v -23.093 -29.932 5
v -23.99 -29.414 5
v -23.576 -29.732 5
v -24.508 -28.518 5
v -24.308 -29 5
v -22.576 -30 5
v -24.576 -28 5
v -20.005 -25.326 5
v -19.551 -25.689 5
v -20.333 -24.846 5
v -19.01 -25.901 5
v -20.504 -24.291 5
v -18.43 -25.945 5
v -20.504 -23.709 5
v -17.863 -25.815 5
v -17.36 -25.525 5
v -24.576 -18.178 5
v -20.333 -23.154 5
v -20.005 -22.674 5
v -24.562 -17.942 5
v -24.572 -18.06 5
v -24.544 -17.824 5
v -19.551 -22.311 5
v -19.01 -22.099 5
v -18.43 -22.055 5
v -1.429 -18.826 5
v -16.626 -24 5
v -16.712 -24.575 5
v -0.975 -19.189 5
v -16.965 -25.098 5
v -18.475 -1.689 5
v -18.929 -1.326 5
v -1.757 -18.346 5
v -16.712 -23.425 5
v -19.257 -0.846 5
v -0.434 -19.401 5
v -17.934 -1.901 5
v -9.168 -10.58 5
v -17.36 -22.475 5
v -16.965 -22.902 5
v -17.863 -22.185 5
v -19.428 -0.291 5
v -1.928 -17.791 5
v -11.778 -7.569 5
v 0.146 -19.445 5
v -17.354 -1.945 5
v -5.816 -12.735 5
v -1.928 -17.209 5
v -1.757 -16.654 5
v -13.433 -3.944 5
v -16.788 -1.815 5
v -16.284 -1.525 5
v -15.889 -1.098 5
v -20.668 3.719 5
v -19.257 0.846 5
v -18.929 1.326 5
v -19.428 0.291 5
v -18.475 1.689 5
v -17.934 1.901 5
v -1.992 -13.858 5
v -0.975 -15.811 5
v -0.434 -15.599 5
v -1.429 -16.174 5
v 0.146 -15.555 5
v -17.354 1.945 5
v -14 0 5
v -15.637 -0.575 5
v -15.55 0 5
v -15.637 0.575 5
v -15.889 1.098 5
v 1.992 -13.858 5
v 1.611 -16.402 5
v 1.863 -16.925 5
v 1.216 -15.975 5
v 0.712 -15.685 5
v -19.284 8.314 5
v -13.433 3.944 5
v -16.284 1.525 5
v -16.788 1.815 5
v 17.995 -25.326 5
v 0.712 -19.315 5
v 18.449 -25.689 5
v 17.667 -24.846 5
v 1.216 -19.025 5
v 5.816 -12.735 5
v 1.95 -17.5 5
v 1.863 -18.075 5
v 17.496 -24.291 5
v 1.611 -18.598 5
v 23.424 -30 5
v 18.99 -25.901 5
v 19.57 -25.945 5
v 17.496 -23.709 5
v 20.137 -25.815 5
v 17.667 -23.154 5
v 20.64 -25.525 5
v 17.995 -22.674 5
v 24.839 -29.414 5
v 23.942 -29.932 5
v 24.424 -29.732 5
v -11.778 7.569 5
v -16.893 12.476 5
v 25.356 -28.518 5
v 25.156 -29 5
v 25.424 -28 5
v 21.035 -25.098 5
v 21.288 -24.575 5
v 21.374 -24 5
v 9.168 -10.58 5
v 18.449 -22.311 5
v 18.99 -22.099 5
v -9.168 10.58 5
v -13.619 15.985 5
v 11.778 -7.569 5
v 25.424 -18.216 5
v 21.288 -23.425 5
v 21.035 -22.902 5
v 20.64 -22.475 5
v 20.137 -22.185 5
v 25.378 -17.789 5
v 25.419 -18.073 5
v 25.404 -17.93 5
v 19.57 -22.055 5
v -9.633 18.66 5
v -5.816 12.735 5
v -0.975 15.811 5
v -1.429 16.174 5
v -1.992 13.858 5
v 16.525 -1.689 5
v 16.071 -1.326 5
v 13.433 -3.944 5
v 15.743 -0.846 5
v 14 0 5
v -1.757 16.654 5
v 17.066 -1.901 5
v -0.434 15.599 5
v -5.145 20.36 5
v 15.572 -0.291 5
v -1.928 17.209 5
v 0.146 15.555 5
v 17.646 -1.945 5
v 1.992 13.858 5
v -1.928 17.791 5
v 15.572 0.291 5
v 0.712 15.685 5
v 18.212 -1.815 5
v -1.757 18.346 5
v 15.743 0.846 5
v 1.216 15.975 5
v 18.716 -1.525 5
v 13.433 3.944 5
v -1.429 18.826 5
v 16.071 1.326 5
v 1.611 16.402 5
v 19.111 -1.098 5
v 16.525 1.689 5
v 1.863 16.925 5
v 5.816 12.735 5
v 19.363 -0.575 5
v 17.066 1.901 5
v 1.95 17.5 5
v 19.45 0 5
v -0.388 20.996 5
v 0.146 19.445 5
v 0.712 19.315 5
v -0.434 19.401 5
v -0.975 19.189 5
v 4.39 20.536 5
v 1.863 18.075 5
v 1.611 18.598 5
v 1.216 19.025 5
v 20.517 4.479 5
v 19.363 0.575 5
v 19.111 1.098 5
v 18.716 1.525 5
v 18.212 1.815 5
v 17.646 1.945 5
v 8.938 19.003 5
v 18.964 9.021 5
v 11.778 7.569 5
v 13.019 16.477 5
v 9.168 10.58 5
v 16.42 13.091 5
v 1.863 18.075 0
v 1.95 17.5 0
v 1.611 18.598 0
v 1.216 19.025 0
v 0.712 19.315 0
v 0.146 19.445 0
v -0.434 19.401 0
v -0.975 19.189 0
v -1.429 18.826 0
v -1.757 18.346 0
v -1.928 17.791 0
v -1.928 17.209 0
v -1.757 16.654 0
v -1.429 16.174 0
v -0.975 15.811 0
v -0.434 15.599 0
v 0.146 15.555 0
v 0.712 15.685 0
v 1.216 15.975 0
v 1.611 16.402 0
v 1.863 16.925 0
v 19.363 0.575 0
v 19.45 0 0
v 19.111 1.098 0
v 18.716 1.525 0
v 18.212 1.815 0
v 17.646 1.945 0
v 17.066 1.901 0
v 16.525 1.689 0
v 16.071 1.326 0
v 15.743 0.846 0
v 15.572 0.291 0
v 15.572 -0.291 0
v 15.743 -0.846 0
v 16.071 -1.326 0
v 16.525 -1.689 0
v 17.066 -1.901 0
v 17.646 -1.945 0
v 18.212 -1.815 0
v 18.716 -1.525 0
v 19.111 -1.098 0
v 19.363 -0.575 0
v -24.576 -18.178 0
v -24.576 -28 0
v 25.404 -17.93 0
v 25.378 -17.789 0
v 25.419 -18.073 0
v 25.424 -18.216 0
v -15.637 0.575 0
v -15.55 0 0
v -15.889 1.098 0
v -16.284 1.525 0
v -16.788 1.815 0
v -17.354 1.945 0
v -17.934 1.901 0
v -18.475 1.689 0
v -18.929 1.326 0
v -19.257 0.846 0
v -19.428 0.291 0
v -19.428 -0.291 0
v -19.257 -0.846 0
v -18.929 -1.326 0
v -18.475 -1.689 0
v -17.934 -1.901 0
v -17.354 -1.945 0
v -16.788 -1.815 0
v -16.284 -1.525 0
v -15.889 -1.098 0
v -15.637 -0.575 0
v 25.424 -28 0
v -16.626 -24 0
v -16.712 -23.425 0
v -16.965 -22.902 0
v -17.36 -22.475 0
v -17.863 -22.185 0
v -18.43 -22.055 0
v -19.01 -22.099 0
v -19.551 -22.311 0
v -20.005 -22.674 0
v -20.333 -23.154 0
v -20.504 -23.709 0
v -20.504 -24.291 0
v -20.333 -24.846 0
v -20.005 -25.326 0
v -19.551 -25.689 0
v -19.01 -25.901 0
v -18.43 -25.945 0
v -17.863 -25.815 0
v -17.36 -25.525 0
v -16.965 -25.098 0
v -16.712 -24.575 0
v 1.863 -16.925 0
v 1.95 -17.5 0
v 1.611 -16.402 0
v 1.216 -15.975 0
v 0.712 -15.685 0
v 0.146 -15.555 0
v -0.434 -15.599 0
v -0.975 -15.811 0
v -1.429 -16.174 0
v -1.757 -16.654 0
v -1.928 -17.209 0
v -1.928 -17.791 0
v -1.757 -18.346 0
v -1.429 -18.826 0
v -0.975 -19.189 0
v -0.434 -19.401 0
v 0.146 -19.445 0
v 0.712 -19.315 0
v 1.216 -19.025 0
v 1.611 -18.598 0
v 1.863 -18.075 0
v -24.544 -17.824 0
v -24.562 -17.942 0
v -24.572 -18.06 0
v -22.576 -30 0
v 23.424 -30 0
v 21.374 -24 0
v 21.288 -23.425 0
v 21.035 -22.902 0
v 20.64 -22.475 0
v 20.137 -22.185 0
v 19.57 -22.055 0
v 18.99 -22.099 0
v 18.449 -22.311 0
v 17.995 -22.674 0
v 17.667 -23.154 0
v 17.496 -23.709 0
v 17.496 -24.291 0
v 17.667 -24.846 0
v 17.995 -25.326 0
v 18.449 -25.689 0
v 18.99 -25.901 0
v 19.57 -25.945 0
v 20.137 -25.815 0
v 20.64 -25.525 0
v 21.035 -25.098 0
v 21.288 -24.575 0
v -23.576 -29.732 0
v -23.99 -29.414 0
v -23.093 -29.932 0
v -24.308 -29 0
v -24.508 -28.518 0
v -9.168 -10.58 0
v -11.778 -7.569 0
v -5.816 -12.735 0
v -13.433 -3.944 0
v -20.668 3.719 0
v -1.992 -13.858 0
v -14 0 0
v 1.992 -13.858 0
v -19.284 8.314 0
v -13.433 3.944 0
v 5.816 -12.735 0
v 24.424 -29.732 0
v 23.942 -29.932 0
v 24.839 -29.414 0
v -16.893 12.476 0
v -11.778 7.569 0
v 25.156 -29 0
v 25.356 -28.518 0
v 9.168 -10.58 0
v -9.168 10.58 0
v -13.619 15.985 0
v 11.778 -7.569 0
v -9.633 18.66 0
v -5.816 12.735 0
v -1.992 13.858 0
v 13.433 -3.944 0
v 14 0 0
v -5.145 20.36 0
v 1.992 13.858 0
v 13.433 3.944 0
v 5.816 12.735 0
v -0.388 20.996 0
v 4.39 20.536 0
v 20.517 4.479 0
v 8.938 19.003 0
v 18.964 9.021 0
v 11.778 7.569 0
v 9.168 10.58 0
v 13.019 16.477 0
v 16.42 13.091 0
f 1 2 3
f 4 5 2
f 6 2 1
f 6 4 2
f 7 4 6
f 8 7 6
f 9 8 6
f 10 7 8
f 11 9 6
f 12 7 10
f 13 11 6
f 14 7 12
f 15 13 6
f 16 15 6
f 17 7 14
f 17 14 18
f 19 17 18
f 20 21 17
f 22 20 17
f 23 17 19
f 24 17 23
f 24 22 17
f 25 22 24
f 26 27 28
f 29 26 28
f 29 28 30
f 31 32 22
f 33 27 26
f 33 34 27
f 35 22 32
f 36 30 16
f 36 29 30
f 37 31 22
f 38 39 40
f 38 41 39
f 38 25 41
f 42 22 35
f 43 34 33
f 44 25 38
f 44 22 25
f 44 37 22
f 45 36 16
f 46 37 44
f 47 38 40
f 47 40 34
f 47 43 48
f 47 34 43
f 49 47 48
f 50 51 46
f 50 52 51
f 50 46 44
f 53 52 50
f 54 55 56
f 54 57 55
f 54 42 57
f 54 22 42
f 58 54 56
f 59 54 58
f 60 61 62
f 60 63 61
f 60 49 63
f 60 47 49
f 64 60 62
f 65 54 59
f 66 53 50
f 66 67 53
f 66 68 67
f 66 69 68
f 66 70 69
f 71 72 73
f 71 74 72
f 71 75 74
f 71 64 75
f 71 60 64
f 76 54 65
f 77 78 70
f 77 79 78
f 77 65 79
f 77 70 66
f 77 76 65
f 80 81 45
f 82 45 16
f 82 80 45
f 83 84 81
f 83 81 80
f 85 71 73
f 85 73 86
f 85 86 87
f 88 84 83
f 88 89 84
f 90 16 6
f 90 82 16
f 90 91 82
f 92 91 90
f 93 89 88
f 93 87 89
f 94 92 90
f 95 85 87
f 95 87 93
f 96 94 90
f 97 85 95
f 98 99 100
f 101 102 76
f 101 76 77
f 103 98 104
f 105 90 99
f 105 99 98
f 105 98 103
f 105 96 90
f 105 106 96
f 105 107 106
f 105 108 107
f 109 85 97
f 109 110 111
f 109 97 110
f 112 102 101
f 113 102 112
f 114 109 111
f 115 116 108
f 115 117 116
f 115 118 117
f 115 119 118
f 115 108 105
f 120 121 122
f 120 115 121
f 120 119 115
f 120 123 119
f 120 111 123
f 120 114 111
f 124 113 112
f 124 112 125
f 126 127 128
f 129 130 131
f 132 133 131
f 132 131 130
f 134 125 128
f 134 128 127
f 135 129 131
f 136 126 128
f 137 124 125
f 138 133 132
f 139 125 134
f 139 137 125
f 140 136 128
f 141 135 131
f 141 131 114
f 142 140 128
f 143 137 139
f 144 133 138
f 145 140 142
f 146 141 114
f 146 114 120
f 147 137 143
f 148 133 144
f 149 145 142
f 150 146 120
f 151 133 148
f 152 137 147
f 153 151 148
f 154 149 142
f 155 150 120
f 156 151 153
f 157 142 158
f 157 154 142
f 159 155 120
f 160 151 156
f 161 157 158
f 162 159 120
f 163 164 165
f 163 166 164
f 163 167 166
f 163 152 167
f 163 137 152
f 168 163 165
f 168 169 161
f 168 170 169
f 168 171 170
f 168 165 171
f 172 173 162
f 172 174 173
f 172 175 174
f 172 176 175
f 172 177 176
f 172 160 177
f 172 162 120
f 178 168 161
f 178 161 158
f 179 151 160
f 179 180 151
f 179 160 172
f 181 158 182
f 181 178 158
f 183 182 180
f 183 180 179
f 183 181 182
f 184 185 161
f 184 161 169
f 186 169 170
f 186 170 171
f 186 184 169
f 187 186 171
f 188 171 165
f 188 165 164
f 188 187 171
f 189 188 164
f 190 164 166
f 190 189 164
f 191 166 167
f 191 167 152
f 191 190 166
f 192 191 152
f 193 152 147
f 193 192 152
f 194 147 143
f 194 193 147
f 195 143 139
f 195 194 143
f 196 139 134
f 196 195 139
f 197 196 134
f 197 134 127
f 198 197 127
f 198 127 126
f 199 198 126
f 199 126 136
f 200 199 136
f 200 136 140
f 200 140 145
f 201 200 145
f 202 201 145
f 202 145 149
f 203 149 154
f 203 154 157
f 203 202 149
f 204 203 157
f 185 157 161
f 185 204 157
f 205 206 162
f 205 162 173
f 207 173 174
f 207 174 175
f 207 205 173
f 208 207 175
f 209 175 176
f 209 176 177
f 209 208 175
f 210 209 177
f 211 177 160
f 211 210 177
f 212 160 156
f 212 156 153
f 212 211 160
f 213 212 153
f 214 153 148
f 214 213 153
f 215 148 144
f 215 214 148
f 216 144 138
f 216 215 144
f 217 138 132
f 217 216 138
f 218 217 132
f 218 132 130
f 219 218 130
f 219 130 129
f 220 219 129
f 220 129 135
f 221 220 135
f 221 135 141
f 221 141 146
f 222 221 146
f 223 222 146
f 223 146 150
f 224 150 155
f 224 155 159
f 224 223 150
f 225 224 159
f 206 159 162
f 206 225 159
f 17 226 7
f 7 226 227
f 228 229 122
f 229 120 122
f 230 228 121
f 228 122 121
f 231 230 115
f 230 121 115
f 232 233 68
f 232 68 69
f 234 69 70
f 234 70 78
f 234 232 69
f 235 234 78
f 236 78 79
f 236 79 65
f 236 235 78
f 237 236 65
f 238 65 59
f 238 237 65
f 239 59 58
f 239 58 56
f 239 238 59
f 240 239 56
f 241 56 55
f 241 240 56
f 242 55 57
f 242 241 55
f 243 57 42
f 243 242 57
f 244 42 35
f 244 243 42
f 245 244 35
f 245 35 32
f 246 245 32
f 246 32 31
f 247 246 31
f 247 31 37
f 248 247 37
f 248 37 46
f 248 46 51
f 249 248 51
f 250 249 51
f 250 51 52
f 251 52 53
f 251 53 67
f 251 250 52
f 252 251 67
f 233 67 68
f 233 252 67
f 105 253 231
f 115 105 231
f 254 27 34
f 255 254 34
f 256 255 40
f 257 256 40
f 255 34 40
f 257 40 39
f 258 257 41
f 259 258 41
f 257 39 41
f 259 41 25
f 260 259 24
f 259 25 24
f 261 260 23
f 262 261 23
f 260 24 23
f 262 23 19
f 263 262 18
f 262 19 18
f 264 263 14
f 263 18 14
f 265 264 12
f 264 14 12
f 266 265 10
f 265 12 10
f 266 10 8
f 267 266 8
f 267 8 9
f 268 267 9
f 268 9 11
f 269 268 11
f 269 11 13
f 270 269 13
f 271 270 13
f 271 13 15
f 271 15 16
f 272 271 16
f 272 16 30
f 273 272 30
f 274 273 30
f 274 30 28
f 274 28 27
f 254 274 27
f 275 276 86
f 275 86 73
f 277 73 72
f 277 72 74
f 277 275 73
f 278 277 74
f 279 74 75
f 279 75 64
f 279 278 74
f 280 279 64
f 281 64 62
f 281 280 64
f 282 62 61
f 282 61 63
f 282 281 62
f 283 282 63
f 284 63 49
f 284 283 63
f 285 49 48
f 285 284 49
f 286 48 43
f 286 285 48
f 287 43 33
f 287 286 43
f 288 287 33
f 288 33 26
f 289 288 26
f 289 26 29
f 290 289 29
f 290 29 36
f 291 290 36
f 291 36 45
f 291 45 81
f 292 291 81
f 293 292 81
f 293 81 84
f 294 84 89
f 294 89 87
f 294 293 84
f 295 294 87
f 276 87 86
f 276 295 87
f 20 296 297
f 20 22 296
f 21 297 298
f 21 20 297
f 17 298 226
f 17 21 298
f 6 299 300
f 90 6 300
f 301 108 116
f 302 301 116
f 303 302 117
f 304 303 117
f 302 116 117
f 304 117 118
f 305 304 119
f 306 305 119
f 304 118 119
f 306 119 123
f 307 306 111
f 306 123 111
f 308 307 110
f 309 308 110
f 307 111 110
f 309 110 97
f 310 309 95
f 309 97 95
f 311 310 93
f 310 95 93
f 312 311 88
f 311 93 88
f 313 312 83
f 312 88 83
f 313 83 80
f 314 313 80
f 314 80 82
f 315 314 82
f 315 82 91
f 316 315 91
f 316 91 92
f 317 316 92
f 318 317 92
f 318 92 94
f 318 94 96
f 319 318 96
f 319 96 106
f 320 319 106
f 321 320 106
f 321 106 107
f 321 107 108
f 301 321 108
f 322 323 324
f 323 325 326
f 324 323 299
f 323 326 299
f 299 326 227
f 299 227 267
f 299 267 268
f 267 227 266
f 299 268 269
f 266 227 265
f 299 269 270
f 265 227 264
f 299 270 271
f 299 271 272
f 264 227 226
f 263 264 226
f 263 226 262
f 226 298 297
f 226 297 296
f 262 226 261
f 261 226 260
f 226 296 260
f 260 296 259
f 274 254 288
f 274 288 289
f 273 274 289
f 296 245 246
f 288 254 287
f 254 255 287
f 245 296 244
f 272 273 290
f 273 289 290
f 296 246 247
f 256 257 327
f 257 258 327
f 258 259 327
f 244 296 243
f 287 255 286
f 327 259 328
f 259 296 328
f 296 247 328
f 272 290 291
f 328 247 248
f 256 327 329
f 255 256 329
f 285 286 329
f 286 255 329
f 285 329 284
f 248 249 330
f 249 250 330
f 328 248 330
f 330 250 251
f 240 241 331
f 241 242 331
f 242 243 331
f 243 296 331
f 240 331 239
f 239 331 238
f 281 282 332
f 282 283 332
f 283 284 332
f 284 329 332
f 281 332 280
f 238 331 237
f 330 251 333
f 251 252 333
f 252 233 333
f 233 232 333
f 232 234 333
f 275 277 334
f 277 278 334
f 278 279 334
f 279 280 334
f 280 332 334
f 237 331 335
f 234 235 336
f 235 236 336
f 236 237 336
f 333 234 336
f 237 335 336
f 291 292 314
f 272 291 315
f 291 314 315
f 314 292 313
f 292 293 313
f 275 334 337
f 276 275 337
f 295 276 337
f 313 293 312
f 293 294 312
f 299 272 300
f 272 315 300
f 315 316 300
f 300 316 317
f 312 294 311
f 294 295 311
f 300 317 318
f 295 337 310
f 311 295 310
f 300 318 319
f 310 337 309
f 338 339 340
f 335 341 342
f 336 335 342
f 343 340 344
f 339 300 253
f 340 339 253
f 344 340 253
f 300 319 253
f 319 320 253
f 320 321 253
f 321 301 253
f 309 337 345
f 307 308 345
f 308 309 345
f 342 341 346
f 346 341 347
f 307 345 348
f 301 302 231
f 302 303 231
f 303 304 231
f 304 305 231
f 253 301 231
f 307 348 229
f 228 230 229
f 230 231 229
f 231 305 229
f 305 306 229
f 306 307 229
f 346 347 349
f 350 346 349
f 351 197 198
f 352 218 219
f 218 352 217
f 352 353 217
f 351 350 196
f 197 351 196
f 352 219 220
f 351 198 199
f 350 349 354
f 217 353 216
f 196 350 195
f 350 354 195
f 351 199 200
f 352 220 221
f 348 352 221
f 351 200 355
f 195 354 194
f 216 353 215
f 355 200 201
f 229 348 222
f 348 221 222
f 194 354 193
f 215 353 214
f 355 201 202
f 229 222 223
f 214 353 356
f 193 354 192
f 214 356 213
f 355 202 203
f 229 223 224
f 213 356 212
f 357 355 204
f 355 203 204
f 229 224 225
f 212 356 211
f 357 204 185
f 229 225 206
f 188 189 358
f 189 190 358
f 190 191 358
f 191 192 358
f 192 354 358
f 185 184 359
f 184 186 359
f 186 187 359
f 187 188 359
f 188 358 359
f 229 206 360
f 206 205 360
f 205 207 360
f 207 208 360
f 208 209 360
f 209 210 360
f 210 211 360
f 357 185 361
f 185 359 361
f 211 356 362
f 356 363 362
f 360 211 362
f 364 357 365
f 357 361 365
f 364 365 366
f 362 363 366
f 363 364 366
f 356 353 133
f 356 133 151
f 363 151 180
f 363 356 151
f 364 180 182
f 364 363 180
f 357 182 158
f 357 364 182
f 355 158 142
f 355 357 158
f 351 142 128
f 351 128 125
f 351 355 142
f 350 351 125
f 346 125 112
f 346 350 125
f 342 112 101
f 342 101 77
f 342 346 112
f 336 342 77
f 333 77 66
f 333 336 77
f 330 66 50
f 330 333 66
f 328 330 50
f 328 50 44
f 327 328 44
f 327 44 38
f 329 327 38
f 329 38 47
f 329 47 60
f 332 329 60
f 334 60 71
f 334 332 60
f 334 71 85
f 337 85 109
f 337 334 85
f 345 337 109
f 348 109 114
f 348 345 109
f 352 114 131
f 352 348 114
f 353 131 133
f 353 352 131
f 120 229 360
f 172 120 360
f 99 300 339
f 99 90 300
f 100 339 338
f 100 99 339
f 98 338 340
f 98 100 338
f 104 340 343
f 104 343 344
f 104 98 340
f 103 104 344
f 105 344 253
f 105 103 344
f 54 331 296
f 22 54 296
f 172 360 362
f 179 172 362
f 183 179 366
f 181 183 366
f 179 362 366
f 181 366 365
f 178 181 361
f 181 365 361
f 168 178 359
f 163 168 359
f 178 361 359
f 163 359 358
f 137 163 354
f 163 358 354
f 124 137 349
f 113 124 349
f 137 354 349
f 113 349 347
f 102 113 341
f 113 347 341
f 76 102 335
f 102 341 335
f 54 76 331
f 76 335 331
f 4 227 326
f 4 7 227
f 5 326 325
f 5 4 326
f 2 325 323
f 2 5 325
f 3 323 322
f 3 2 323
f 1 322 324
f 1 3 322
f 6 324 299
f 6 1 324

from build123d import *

# Parameters (mm, degrees)
SKETCH_1_R          = 1.95
SKETCH_1_R_2        = 14
EXTRUDE_1_DEPTH     = 5
SKETCH_2_R          = 1.95
CUT_EXTRUDE_1_DEPTH = 40.6408375
FILLET_1_R          = 2


with BuildPart() as part:
    # 草图1 → 凸台-拉伸1 (new body)
    with BuildSketch(Plane.XY):
        with BuildLine():
            Line((-20.668149566, 3.718547232), (-24.575680979, -18))
            Line((-24.575680979, -18), (-24.575680979, -30))
            Line((-24.575680979, -30), (25.424319021, -30))
            Line((25.424319021, -30), (25.424319021, -18))
            Line((25.424319021, -18), (20.516756247, 4.479142005))
            ThreePointArc((20.516756247, 4.479142005), (-0.387757768, 20.996419788), (-20.668149566, 3.718547232))
        make_face()
        with Locations((0, 17.5)):
            Circle(SKETCH_1_R, mode=Mode.SUBTRACT)
        with Locations((17.5, 0)):
            Circle(SKETCH_1_R, mode=Mode.SUBTRACT)
        with Locations((0, -17.5)):
            Circle(SKETCH_1_R, mode=Mode.SUBTRACT)
        with Locations((-17.5, 0)):
            Circle(SKETCH_1_R, mode=Mode.SUBTRACT)
        Circle(SKETCH_1_R_2, mode=Mode.SUBTRACT)
    extrude(amount=EXTRUDE_1_DEPTH)

    # 草图2 → 切除-拉伸1 (cut, through all)
    with BuildSketch(Plane.XY.offset(5)):
        with Locations((19.424319021, -24)):
            Circle(SKETCH_2_R)
        with Locations((-18.575680979, -24)):
            Circle(SKETCH_2_R)
    extrude(amount=-CUT_EXTRUDE_1_DEPTH, mode=Mode.SUBTRACT)

    # 圆角1
    fillet_1_edges = [part.edges().sort_by_distance(p)[0] for p in [
        (25.424319021, -18, 2.5),
        (25.424319021, -30, 2.5),
        (-24.575680979, -30, 2.5),
        (-24.575680979, -18, 2.5),
    ]]
    fillet(fillet_1_edges, radius=FILLET_1_R)


solid = part.part
